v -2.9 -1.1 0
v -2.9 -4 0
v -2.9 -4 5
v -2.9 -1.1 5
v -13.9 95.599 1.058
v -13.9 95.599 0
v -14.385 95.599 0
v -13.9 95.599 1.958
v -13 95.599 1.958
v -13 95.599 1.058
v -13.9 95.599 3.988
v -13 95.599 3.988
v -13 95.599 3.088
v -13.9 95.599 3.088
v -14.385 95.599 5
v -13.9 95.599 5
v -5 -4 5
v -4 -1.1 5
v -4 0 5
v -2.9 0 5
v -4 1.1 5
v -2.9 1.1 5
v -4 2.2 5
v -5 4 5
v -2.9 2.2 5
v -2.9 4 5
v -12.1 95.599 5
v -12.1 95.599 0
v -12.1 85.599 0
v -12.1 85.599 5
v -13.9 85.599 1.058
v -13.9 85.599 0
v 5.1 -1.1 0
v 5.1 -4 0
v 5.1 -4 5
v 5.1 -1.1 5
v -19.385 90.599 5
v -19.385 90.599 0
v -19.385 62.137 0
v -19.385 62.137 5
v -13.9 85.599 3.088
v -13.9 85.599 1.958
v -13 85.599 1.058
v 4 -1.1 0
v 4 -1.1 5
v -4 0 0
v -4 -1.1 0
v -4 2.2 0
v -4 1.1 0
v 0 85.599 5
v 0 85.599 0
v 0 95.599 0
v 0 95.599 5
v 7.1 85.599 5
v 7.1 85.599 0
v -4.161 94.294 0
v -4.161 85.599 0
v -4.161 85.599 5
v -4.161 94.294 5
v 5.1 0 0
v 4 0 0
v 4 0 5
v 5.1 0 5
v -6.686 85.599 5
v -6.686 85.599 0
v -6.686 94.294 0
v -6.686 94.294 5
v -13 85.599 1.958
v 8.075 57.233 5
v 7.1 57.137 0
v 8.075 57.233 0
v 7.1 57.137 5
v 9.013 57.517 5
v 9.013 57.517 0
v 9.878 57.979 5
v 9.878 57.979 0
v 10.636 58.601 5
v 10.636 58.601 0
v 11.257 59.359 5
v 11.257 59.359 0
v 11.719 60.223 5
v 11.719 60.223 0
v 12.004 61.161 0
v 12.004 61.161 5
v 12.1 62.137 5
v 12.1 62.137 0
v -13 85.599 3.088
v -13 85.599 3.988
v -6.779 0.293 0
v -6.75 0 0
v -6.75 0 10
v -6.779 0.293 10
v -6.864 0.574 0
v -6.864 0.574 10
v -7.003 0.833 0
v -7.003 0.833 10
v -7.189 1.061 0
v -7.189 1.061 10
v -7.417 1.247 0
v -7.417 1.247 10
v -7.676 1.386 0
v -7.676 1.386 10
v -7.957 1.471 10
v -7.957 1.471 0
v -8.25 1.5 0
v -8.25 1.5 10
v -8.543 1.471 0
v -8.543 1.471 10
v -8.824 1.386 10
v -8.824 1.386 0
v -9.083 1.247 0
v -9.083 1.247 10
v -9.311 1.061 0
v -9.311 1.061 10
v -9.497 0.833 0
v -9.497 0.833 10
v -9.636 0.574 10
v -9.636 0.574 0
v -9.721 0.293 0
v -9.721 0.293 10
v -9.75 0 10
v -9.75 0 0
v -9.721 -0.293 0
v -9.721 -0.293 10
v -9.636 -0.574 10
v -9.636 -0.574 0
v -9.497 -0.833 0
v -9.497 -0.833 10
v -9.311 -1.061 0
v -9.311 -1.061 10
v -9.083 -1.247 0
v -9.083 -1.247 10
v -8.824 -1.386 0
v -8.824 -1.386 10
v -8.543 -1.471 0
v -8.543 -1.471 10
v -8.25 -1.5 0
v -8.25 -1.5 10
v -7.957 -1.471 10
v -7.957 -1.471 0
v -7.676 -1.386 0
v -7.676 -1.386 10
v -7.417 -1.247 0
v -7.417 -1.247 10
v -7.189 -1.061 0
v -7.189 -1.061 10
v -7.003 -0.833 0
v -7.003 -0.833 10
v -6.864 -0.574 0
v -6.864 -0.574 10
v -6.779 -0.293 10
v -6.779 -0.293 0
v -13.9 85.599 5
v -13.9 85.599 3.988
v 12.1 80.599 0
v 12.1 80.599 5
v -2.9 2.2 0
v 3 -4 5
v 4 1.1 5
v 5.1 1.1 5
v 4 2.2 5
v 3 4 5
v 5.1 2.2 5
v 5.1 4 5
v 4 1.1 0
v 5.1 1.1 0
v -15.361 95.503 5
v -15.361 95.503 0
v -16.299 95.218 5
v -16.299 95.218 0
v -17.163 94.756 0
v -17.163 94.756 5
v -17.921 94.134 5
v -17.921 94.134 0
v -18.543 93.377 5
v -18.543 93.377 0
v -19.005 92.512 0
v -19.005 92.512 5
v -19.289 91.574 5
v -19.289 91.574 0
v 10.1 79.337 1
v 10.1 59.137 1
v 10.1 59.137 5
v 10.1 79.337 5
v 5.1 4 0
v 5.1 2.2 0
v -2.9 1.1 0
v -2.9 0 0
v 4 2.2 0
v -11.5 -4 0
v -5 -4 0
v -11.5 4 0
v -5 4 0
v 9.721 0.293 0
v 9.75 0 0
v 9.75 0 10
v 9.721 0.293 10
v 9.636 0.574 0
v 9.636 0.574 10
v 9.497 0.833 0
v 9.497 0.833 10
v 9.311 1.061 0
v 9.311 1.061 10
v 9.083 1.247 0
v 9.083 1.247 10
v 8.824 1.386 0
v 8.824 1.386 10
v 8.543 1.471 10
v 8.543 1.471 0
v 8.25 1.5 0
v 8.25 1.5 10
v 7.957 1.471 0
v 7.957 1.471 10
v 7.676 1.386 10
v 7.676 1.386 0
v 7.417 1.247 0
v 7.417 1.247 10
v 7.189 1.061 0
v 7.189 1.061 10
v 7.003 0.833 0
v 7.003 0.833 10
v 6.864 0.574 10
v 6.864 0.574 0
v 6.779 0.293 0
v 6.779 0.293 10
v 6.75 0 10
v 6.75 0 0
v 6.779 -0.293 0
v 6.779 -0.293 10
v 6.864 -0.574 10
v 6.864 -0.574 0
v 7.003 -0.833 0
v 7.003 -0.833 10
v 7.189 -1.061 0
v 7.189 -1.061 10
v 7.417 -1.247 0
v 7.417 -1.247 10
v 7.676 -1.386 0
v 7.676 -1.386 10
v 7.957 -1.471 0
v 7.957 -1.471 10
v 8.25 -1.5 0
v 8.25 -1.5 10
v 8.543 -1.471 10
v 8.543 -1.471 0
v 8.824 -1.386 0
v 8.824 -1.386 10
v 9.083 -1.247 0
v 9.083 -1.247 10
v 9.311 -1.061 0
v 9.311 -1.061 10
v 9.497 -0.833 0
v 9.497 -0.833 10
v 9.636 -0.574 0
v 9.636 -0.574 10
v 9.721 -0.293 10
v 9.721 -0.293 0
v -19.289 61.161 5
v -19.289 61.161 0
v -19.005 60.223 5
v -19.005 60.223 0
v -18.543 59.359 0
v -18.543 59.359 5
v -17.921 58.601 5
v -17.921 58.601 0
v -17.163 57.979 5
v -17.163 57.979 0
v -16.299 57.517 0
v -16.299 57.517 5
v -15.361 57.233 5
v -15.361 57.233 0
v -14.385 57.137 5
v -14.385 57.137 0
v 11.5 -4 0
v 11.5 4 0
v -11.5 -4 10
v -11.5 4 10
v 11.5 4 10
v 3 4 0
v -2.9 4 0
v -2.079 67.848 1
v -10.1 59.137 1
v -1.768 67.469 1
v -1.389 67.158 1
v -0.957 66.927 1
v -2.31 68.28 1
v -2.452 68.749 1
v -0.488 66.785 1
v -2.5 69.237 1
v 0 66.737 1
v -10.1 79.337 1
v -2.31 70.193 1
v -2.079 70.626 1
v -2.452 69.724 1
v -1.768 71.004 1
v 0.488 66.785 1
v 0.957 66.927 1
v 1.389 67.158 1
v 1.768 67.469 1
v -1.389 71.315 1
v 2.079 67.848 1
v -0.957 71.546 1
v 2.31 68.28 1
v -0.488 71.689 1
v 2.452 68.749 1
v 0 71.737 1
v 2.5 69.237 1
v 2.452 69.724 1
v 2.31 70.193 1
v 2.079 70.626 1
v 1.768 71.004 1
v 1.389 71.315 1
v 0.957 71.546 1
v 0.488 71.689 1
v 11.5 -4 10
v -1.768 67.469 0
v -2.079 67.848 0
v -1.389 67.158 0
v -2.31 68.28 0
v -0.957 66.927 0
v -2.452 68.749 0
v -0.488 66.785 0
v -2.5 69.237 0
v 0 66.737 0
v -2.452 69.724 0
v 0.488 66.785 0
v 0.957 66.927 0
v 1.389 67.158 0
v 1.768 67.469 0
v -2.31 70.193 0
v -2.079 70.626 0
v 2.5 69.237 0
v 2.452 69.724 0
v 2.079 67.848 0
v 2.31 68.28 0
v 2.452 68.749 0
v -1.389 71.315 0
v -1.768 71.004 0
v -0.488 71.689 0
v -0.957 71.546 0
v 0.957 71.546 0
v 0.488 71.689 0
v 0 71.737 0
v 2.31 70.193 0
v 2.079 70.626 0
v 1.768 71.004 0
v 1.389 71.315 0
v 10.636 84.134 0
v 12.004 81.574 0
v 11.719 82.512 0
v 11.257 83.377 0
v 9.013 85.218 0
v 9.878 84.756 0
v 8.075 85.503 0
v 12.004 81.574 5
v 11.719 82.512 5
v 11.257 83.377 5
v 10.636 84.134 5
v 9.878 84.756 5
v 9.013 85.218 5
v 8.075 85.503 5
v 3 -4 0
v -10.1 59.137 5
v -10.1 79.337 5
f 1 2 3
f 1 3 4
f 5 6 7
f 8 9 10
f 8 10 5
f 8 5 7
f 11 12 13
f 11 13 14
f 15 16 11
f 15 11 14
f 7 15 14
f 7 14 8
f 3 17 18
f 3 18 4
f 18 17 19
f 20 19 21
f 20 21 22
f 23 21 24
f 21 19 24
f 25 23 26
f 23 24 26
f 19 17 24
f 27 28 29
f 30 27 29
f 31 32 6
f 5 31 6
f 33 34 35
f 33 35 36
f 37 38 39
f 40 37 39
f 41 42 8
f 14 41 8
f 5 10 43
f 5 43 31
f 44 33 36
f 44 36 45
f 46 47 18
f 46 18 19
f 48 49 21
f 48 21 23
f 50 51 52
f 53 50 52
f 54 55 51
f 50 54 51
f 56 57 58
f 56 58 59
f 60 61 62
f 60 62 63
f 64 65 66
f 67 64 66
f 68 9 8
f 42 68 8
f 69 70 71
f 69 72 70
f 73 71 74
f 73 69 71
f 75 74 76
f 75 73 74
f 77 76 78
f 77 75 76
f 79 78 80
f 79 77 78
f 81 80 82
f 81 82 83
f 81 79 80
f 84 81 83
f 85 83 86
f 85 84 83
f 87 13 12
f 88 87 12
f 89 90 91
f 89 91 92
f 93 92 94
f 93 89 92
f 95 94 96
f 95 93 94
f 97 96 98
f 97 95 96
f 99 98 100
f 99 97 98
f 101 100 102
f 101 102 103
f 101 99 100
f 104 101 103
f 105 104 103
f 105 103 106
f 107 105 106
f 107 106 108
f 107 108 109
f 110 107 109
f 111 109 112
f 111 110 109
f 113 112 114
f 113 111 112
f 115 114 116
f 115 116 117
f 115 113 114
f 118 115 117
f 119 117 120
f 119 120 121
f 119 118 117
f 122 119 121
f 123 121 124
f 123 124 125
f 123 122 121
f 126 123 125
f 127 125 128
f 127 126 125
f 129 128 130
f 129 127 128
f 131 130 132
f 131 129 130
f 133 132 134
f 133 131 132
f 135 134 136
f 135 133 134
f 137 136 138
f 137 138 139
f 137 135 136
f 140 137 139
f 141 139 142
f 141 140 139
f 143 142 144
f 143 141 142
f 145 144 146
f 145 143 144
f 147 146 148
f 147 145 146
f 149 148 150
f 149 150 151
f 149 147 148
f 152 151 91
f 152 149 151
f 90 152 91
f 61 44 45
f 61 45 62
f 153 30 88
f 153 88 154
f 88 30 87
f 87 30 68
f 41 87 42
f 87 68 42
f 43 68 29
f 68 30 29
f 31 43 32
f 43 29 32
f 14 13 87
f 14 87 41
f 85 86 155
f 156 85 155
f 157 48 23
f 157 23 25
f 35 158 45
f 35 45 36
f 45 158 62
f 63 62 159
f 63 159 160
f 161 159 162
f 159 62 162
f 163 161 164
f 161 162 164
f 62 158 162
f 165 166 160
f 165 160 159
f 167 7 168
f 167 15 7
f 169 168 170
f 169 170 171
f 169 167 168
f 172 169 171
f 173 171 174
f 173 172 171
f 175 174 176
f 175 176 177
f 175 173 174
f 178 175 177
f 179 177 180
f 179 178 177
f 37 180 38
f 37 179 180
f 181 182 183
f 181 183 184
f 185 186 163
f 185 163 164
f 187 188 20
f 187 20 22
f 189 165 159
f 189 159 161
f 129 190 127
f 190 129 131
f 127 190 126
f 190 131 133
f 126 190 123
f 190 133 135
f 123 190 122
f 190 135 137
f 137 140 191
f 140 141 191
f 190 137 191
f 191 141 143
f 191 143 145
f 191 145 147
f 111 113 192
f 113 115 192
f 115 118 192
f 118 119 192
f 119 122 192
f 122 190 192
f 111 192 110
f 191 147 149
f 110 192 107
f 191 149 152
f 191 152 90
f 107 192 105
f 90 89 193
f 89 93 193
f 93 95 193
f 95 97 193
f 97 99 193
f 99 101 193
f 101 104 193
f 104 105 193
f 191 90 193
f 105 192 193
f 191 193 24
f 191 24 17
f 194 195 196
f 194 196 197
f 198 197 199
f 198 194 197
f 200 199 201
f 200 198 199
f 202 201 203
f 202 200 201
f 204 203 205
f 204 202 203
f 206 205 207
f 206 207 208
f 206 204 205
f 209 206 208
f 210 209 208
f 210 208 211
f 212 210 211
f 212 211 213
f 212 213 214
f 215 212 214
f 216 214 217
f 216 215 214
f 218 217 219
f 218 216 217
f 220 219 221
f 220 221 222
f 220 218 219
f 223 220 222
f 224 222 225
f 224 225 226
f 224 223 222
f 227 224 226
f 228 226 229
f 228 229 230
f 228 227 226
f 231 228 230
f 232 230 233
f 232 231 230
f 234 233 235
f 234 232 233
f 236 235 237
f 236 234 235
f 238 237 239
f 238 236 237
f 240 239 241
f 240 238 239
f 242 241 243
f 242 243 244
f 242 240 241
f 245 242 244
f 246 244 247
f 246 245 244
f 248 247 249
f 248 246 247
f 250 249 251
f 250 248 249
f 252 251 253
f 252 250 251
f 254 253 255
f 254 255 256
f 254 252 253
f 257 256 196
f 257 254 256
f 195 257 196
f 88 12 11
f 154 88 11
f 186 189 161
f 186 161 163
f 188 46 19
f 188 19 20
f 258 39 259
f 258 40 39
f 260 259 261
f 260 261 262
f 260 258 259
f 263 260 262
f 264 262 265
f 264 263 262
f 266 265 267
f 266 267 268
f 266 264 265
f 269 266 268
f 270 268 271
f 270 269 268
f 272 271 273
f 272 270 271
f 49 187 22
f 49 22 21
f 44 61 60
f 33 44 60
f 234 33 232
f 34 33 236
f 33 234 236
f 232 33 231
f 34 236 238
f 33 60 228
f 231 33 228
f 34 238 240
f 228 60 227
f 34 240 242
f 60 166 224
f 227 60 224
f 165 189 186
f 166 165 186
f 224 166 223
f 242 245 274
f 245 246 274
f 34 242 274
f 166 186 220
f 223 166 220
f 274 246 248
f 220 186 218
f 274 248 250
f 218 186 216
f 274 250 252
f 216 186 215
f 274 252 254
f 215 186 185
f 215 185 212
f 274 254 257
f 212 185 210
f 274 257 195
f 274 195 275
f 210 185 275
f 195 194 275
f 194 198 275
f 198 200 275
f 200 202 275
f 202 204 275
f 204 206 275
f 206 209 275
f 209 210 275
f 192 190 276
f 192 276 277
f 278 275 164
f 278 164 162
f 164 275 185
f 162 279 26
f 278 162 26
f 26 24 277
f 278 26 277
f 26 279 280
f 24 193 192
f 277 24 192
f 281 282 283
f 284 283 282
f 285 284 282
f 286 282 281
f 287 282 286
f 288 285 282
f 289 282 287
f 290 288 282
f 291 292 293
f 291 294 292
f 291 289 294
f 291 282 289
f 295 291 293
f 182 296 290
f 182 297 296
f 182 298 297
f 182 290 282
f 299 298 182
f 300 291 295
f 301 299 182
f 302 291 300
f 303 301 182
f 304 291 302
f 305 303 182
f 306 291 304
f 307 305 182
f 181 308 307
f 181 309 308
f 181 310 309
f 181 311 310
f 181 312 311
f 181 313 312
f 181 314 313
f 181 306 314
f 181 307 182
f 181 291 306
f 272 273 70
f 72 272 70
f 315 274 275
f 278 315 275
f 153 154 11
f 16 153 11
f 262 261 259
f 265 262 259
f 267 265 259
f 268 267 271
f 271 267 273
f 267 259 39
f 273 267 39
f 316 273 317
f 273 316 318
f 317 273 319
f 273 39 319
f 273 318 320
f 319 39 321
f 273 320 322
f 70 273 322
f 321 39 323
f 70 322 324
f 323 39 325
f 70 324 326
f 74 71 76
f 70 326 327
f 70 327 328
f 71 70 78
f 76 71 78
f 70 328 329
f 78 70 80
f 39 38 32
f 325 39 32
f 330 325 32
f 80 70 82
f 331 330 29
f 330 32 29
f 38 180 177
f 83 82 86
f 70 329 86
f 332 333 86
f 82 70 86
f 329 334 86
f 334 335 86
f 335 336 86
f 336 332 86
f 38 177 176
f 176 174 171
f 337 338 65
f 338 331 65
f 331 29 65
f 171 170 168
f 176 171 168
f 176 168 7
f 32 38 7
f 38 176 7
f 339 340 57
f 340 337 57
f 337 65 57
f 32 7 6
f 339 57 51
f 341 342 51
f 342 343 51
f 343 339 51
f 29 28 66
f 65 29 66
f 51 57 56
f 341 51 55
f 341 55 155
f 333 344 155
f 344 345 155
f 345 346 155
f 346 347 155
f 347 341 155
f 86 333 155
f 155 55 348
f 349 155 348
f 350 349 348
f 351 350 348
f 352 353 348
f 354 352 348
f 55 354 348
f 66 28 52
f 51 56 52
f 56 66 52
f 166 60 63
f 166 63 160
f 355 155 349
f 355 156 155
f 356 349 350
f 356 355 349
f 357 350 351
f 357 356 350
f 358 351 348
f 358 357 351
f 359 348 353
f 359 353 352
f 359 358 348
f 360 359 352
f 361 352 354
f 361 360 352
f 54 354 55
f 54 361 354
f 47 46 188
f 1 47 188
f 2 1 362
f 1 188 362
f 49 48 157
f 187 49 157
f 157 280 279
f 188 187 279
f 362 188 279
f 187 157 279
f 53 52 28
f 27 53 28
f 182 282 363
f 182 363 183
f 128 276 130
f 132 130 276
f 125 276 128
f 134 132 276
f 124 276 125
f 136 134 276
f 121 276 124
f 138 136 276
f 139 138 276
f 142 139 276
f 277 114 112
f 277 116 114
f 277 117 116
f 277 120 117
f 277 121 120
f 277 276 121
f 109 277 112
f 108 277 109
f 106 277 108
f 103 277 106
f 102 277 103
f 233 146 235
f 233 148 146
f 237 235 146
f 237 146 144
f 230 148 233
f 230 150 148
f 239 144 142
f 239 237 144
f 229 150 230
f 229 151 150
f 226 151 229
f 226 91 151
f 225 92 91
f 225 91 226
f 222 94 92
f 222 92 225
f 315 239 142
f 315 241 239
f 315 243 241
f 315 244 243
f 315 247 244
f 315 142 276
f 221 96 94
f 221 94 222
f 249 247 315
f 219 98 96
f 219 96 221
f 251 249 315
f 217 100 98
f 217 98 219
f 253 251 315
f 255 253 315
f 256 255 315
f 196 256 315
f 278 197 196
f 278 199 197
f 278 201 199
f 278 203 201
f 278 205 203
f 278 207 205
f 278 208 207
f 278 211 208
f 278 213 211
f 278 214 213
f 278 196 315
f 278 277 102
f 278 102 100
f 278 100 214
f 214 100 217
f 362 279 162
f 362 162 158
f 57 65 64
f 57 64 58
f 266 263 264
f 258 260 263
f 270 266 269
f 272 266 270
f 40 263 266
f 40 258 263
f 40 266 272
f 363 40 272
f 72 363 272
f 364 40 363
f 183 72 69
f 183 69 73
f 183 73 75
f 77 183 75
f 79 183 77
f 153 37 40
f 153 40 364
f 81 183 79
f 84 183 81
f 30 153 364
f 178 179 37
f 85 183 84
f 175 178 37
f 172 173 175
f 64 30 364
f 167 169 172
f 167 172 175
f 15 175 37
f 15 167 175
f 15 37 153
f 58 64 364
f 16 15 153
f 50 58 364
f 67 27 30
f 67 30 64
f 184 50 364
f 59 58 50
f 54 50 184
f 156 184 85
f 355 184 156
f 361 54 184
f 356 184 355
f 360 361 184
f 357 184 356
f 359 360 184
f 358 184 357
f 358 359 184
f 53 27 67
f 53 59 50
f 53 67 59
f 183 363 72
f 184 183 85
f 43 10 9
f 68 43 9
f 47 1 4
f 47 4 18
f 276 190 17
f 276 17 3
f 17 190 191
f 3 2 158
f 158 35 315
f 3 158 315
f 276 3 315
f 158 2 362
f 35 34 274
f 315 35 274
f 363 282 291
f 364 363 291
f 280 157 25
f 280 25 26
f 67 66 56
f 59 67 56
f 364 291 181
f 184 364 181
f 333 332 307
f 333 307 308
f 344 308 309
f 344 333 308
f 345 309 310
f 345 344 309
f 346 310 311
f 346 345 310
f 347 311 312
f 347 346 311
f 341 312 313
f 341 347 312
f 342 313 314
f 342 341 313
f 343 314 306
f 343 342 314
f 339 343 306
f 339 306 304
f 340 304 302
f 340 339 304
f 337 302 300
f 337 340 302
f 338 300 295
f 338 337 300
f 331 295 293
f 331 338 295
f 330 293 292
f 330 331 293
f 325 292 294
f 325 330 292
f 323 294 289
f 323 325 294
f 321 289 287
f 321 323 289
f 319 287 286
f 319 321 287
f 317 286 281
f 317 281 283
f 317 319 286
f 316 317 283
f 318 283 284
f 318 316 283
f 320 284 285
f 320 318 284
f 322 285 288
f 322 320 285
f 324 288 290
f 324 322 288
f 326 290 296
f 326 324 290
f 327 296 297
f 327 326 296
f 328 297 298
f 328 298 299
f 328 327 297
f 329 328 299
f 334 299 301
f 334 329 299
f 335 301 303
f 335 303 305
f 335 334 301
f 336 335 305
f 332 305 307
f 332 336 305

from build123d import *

# Parameters (mm, degrees)
F0_W     = 6.5
F0_H     = 8
F0_R     = 1.5
F1_DEPTH = 10
F2_DEPTH = 5
F3_W     = 20.2
F3_H     = 20.2
F3_W_2   = 2.525257
F3_H_2   = 8.694927
F4_DEPTH = 5
F3_R     = 2.5
F5_DEPTH = 1
F6_W     = 0.9
F6_H     = 0.9
F7_DEPTH = 12
F8_R     = 5


with BuildPart() as f1:
    # F0 (on Top) → F1 (new body)
    with BuildSketch(Plane.XY):
        with Locations((-8.25, 0)):
            Rectangle(F0_W, F0_H)
        with Locations((-8.25, 0)):
            Circle(F0_R, mode=Mode.SUBTRACT)
        Polygon((-2.9, 4), (-5, 4), (-5, -4), (-2.9, -4), (-2.9, -1.1), (-4, -1.1), (-4, 0), (-2.9, 0), (-2.9, 1.1), (-4, 1.1), (-4, 2.2), (-2.9, 2.2), align=None)
        Polygon((5.1, 4), (3, 4), (3, -4), (5.1, -4), (5.1, -1.1), (4, -1.1), (4, 0), (5.1, 0), (5.1, 1.1), (4, 1.1), (4, 2.2), (5.1, 2.2), align=None)
        Polygon((11.5, 4), (5.1, 4), (5.1, 2.2), (4, 2.2), (4, 1.1), (5.1, 1.1), (5.1, 0), (4, 0), (4, -1.1), (5.1, -1.1), (5.1, -4), (11.5, -4), align=None)
        with Locations((8.25, 0)):
            Circle(F0_R, mode=Mode.SUBTRACT)
        Polygon((3, 4), (-2.9, 4), (-2.9, 2.2), (-4, 2.2), (-4, 1.1), (-2.9, 1.1), (-2.9, 0), (-4, 0), (-4, -1.1), (-2.9, -1.1), (-2.9, -4), (3, -4), align=None)
    extrude(amount=F1_DEPTH)

    # F0 (on Top) → F2 (cut)
    with BuildSketch(Plane.XY):
        Polygon((-2.9, 4), (-5, 4), (-5, -4), (-2.9, -4), (-2.9, -1.1), (-4, -1.1), (-4, 0), (-2.9, 0), (-2.9, 1.1), (-4, 1.1), (-4, 2.2), (-2.9, 2.2), align=None)
        Polygon((5.1, 4), (3, 4), (3, -4), (5.1, -4), (5.1, -1.1), (4, -1.1), (4, 0), (5.1, 0), (5.1, 1.1), (4, 1.1), (4, 2.2), (5.1, 2.2), align=None)
    extrude(amount=F2_DEPTH, mode=Mode.SUBTRACT)


with BuildPart() as f4:
    # F3 (on Top) → F4 (new body)
    with BuildSketch(Plane.XY):
        Polygon((0, 85.598824), (0, 95.598824), (-12.1, 95.598824), (-12.1, 85.598824), (-13.9, 85.598824), (-13.9, 95.598824), (-19.385282, 95.598824), (-19.385282, 57.136595), (-12.1, 57.136595), (12.1, 57.136595), (12.1, 85.598824), align=None)
        with Locations((0, 69.236595)):
            Rectangle(F3_W, F3_H, mode=Mode.SUBTRACT)
        with Locations((-5.423652, 89.946287)):
            Rectangle(F3_W_2, F3_H_2, mode=Mode.SUBTRACT)
    extrude(amount=F4_DEPTH)

    # F3 (on Top) → F5 (join)
    with BuildSketch(Plane.XY):
        with Locations((0, 69.236595)):
            Rectangle(F3_W, F3_H)
        with Locations((0, 69.236595)):
            Circle(F3_R, mode=Mode.SUBTRACT)
    extrude(amount=F5_DEPTH)

    # F6 (on face) → F7 (join)
    with BuildSketch(Plane(origin=(0, 95.598824, 0), x_dir=(-1, 0, 0), z_dir=(0, 1, 0))):
        with Locations((13.45, 3.537829)):
            Rectangle(F6_W, F6_H)
        with Locations((13.45, 1.507829)):
            Rectangle(F6_W, F6_H)
    extrude(amount=-F7_DEPTH)

    # F8
    f8_edges = [f4.edges().sort_by_distance(p)[0] for p in [
        (-19.385282, 57.136595, 2.5),
        (12.1, 57.136595, 2.5),
        (12.1, 85.598824, 2.5),
        (-19.385282, 95.598824, 2.5),
    ]]
    fillet(f8_edges, radius=F8_R)


solid = Compound([f1.part, f4.part])
